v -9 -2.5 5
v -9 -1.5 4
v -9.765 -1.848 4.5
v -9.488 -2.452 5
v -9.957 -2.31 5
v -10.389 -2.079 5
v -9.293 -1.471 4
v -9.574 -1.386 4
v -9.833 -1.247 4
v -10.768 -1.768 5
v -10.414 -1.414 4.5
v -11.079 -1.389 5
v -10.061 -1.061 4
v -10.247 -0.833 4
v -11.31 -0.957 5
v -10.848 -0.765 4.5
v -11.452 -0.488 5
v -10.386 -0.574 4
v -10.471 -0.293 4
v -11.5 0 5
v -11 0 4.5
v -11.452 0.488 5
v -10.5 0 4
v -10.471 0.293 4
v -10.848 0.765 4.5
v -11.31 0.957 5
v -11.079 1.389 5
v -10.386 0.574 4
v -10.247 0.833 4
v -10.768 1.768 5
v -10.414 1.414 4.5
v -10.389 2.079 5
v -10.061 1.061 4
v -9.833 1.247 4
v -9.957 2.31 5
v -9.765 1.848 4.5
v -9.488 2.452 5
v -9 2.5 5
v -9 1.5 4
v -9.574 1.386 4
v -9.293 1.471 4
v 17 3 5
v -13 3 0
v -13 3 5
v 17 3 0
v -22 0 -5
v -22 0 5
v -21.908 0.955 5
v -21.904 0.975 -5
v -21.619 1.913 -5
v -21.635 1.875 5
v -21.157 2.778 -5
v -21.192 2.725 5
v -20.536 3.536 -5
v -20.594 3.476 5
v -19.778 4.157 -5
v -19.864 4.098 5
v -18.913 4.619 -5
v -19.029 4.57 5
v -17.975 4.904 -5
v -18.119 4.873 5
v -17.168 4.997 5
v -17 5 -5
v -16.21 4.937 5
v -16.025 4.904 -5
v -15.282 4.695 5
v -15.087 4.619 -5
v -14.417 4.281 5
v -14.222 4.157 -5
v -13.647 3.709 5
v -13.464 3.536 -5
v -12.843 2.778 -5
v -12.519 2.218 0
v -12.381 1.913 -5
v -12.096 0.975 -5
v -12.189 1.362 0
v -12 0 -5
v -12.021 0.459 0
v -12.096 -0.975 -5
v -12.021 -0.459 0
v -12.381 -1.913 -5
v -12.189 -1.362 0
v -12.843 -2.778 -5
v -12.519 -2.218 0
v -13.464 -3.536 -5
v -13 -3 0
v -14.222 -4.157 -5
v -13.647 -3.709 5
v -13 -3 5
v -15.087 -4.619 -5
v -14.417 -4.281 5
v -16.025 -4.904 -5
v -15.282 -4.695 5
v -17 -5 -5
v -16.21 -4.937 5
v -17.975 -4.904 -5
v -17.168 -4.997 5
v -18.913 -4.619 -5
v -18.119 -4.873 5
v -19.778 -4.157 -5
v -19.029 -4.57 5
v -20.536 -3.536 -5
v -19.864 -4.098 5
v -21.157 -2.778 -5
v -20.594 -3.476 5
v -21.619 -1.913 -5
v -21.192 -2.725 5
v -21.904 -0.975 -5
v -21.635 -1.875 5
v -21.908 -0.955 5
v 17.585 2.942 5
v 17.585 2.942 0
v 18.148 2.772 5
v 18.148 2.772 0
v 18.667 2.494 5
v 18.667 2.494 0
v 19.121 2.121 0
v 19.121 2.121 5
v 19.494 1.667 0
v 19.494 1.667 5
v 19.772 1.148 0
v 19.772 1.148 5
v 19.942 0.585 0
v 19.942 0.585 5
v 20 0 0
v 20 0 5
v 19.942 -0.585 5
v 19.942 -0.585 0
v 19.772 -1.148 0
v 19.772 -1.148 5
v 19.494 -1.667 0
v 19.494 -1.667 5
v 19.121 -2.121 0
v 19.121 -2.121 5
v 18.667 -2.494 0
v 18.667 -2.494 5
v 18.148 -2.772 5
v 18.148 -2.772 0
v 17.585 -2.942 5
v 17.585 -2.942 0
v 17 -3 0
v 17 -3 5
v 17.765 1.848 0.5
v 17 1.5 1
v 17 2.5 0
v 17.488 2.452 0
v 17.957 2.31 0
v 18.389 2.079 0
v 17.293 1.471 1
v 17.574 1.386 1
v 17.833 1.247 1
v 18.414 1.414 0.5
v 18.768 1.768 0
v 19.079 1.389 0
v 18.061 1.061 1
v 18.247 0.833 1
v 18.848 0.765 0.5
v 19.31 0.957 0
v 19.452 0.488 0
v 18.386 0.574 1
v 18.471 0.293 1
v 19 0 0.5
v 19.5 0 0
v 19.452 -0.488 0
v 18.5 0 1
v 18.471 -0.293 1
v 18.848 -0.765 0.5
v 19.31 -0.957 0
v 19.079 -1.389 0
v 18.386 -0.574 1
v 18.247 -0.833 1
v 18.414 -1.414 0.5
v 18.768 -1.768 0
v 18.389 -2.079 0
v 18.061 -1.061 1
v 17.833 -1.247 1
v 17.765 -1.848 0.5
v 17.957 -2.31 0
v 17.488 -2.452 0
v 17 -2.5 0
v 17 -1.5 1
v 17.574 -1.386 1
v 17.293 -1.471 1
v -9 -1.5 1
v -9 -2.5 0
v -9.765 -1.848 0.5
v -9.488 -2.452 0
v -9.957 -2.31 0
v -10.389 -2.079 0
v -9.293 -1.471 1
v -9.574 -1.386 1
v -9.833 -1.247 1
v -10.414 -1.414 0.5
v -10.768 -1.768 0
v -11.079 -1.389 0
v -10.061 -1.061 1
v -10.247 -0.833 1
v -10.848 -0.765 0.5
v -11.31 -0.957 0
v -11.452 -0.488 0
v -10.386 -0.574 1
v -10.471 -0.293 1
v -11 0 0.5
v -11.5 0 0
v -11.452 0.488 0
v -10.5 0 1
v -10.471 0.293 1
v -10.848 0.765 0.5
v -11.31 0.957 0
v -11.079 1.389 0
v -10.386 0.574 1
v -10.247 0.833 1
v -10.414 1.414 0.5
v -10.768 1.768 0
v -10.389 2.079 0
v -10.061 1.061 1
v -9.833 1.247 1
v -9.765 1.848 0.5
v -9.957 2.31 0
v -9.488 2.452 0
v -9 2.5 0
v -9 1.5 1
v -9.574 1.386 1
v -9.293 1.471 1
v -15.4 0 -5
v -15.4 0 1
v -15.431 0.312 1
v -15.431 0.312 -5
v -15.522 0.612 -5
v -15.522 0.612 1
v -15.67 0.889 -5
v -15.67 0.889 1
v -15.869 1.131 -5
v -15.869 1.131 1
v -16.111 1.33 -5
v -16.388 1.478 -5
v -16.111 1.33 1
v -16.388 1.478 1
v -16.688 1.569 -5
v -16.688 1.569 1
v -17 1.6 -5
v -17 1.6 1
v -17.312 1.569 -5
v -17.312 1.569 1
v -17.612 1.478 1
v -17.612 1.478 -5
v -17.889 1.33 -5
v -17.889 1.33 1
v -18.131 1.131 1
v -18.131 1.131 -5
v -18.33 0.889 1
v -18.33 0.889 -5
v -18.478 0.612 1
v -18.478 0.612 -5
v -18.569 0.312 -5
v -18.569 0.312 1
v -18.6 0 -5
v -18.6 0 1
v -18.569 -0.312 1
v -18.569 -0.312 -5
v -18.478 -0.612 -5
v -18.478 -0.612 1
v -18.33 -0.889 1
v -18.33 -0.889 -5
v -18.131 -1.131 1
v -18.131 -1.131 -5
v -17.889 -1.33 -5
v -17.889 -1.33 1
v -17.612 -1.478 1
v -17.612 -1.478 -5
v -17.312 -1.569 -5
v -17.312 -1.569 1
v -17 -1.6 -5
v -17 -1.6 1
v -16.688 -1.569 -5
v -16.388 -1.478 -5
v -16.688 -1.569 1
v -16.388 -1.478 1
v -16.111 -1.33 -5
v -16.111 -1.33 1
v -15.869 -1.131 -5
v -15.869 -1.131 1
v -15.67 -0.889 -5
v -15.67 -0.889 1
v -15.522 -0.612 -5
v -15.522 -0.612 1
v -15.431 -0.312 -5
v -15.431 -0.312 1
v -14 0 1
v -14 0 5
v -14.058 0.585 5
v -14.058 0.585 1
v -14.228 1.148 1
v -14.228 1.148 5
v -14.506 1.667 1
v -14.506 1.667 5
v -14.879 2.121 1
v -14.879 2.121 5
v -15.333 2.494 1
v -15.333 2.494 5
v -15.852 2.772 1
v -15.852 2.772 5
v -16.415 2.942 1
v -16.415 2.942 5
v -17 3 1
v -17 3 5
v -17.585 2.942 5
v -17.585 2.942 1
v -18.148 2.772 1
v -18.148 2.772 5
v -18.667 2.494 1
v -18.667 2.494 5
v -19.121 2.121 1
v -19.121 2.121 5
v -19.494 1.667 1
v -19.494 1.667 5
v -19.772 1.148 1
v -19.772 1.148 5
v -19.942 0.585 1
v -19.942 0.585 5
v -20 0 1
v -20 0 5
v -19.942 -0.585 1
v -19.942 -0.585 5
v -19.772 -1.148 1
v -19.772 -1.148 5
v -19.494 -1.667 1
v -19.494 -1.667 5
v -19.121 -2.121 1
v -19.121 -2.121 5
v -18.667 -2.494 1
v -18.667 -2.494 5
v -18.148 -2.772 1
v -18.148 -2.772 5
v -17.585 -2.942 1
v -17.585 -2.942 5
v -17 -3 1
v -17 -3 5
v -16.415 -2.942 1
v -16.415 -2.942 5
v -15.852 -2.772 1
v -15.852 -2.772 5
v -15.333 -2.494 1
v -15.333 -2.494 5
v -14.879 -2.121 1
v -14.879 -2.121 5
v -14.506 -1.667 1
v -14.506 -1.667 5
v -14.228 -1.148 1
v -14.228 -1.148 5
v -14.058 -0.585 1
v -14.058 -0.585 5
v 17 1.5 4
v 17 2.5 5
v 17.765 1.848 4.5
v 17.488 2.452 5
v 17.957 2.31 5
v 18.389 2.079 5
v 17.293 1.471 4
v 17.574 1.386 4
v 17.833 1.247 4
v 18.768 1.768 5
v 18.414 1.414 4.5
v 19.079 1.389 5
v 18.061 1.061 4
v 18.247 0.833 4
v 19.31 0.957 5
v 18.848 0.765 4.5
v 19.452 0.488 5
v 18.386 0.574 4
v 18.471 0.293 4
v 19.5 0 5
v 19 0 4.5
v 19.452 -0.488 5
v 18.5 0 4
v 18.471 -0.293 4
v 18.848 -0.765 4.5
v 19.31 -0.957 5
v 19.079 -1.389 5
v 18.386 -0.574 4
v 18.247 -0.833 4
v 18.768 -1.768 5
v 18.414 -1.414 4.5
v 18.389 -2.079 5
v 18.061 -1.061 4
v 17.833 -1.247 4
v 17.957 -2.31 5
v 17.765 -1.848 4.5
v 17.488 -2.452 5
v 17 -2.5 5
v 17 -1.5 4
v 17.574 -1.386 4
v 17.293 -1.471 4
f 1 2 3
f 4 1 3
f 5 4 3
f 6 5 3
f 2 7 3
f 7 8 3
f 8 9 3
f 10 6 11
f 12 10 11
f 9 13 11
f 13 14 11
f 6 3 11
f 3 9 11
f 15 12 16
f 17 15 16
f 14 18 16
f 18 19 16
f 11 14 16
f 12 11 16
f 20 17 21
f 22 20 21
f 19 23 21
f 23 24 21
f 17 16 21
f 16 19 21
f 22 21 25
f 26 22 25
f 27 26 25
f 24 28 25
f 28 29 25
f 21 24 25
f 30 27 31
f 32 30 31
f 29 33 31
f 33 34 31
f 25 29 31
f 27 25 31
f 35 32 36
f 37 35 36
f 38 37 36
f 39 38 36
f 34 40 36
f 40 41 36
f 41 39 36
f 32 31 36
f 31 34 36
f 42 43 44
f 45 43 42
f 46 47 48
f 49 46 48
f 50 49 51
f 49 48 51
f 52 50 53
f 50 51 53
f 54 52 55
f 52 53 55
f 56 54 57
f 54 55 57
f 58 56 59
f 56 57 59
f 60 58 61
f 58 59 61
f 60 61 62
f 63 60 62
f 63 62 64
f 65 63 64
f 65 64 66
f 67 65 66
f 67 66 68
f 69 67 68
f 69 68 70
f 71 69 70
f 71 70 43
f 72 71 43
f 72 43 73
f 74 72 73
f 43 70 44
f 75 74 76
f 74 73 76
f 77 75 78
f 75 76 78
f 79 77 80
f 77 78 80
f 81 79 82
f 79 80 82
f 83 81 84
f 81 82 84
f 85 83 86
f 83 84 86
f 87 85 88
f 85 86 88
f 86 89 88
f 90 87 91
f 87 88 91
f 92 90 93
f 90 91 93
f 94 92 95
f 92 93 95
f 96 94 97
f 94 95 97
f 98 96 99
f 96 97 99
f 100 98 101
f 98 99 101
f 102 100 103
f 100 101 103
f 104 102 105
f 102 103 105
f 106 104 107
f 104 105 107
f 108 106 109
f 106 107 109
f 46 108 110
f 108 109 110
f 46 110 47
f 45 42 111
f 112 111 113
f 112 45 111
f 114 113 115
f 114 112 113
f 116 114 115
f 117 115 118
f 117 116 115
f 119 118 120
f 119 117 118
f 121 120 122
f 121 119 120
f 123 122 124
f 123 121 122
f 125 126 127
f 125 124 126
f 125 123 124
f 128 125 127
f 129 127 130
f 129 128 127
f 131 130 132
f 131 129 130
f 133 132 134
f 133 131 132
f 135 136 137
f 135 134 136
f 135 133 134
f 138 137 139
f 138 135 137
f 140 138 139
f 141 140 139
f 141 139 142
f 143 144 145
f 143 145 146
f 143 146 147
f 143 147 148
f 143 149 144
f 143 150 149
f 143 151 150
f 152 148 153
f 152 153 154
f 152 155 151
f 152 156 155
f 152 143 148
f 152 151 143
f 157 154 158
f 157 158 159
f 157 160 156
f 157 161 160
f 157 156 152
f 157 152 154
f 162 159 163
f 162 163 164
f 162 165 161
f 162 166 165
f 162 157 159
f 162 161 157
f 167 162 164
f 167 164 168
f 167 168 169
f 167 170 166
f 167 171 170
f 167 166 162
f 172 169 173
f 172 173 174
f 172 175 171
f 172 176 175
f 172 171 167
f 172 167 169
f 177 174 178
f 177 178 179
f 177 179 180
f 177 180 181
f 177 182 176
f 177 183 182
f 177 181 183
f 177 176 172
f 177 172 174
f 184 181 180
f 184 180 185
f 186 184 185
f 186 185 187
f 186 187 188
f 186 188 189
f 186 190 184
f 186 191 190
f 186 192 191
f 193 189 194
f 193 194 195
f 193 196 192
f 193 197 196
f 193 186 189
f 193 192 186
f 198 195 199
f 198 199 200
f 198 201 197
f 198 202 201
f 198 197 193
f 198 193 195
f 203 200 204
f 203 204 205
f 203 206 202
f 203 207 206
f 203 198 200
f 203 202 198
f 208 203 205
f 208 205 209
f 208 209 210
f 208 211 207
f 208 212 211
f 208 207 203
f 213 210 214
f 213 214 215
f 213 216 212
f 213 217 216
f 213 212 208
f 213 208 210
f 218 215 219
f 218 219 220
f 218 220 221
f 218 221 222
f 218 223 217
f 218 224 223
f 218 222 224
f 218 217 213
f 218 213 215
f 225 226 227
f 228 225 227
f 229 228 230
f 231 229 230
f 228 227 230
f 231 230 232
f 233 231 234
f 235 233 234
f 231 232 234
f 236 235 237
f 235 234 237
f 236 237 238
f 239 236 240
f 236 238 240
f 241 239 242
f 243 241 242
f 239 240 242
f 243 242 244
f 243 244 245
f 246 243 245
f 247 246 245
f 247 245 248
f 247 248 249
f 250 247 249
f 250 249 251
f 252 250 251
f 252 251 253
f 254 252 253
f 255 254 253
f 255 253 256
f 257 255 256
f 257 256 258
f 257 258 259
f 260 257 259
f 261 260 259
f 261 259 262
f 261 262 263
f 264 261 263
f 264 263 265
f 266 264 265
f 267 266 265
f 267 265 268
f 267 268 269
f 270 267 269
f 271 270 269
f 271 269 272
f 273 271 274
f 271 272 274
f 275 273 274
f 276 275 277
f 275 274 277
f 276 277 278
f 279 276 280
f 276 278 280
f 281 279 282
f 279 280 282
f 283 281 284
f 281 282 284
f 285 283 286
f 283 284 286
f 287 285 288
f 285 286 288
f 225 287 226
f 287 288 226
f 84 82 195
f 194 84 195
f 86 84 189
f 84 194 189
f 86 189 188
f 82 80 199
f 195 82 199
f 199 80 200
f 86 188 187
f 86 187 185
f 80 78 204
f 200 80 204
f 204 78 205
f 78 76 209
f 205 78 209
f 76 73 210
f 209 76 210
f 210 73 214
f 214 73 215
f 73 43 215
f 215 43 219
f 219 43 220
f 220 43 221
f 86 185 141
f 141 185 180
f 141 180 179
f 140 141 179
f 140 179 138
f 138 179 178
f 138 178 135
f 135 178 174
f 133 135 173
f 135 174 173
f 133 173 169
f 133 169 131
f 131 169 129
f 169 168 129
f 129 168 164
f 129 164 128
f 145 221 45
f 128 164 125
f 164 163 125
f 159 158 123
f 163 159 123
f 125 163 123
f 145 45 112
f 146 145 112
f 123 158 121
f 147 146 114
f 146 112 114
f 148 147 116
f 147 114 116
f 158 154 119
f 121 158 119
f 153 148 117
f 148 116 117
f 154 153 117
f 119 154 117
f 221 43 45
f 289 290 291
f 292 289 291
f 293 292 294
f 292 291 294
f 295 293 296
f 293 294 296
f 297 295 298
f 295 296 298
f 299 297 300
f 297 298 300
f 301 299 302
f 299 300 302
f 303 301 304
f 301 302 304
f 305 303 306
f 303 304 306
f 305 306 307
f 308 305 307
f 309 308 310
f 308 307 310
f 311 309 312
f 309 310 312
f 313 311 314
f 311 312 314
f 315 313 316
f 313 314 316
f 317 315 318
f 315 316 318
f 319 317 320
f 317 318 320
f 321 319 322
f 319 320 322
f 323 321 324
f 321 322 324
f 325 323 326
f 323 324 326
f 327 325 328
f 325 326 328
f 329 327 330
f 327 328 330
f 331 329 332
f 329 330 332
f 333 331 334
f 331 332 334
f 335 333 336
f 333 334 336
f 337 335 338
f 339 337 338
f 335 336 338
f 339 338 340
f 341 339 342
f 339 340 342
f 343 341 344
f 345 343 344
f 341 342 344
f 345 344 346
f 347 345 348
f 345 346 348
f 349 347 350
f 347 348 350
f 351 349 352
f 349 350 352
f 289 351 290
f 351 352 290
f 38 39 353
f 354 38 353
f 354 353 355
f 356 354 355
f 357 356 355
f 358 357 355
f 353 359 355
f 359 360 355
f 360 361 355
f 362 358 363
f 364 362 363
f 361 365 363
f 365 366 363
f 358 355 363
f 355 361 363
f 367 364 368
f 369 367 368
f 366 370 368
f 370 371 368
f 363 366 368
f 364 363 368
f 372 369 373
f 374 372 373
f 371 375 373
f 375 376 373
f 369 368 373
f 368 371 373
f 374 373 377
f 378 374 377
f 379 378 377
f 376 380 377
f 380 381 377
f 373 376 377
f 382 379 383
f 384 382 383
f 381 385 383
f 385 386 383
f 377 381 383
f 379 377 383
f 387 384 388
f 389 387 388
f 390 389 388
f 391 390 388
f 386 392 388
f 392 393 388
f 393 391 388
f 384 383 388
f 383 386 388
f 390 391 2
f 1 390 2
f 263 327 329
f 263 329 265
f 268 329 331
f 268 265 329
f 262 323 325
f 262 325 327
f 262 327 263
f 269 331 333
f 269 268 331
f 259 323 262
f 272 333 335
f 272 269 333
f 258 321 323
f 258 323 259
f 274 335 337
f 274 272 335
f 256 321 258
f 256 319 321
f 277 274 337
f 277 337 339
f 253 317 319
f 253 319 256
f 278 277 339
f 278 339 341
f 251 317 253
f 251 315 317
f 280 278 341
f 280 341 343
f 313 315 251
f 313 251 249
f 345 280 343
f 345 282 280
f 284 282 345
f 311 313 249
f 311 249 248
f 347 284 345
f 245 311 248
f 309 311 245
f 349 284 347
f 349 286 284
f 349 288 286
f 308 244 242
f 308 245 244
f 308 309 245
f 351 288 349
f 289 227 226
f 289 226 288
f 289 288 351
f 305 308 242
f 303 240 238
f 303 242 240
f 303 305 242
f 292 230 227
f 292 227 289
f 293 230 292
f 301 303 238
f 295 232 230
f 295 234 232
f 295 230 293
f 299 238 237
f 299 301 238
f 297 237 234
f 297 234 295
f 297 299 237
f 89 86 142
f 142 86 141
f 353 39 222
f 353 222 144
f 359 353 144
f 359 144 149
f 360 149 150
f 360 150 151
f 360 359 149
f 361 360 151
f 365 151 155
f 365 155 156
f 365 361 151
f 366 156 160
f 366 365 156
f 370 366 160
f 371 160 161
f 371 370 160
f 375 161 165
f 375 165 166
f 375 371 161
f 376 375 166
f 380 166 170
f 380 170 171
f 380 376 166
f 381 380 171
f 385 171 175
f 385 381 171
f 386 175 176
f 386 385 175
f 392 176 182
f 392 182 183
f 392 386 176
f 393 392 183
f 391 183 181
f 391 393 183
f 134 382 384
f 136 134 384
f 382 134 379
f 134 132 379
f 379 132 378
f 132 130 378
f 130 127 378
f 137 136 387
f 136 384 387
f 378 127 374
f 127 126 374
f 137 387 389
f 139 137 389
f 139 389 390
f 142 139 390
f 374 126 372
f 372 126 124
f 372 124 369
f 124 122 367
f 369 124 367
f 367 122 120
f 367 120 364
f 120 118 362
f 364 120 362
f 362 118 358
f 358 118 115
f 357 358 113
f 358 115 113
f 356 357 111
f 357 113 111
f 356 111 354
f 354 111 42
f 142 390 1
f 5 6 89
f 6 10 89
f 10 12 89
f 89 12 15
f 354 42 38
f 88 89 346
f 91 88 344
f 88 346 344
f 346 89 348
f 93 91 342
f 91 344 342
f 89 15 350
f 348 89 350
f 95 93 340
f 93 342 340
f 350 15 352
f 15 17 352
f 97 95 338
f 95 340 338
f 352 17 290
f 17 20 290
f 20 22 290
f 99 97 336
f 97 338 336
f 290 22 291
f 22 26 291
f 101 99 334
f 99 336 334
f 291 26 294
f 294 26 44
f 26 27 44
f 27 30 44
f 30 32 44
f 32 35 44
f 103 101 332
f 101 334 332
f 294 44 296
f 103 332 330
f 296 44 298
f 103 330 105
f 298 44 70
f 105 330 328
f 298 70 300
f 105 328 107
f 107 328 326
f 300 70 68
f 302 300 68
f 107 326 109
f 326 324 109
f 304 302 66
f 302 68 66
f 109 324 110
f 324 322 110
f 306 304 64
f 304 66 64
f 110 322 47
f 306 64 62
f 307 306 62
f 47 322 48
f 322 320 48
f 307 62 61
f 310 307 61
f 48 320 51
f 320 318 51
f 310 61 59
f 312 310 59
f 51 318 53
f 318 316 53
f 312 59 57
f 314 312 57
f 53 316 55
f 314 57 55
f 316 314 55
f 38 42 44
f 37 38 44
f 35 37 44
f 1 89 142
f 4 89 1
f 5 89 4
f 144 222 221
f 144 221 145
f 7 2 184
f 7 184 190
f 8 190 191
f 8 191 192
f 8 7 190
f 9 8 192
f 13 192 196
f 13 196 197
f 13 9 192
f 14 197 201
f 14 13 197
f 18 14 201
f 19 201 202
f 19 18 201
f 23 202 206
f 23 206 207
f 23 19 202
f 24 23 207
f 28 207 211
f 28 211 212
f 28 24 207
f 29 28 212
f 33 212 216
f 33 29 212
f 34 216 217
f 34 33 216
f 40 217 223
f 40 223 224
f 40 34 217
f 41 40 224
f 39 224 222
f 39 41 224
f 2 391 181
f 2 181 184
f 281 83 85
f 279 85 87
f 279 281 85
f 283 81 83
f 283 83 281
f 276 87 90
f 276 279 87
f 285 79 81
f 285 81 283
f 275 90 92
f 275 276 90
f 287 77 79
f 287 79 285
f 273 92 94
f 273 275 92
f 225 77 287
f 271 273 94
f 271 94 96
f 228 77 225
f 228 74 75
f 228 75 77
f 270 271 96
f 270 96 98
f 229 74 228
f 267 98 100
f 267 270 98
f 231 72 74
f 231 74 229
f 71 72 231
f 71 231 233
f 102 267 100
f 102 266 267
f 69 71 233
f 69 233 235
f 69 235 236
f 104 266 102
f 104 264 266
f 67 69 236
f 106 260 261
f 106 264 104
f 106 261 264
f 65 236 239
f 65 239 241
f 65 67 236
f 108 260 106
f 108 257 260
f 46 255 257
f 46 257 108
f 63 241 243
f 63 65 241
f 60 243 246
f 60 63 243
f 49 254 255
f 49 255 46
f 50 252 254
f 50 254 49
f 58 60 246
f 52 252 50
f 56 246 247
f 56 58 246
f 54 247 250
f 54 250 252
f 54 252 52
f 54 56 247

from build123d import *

# Parameters (mm, degrees)
SKETCH_1_W          = 40
SKETCH_1_H          = 6
EXTRUDE_1_DEPTH     = 5
SKETCH_3_R          = 3
EXTRUDE_2_DEPTH     = 5
CUT_EXTRUDE_1_DEPTH = 21.832666656
FILLET_1_RADIUS     = 3
FILLET_1_LENGTH     = 5
SKETCH_5_R          = 1.5
CUT_EXTRUDE_2_DEPTH = 23.561028345
SKETCH_6_R          = 2.5
CUT_EXTRUDE_3_DEPTH = 3
CHAMFER_2_SIZE      = 1
SKETCH_7_R          = 4
EXTRUDE_3_DEPTH     = 10
SKETCH_8_R          = 1.5
CUT_EXTRUDE_4_DEPTH = 24.600847442
SKETCH_9_R          = 3
CUT_EXTRUDE_5_DEPTH = 2
SKETCH_10_R         = 1.6
CUT_EXTRUDE_6_DEPTH = 24.600847442
EXTRUDE_START       = -10
SKETCH_11_R         = 5
SKETCH_11_R_2       = 1.6
EXTRUDE_4_DEPTH     = 10
SKETCH_12_R         = 3
CUT_EXTRUDE_7_DEPTH = 4


with BuildPart() as part:
    # Эскиз1 → Бобышка-Вытянуть1 (new body)
    with BuildSketch(Plane.XY):
        Rectangle(SKETCH_1_W, SKETCH_1_H)
    extrude(amount=EXTRUDE_1_DEPTH)

    # Эскиз3 → Бобышка-Вытянуть2 (add)
    with BuildSketch(Plane(origin=(0, 0, 0), x_dir=(-1, 0, 0), z_dir=(0, 0, -1))):
        with Locations((17, 0)):
            Circle(SKETCH_3_R)
    extrude(amount=EXTRUDE_2_DEPTH)

    # Эскиз4 → Вырез-Вытянуть1 (cut, through all)
    with BuildSketch(Plane(origin=(0, 0, 0), x_dir=(-1, 0, 0), z_dir=(0, 0, -1))):
        with BuildLine():
            Line((20, 3), (17, 3))
            ThreePointArc((17, 3), (19.121320344, 2.121320344), (20, 0))
            Line((20, 0), (20, 3))
        make_face()
        with BuildLine():
            Line((20, -3), (20, 0))
            ThreePointArc((20, 0), (19.121320344, -2.121320344), (17, -3))
            Line((17, -3), (20, -3))
        make_face()
    extrude(amount=-CUT_EXTRUDE_1_DEPTH, mode=Mode.SUBTRACT)

    # Скругление1: full round fillet: the end face becomes a half cylinder, R = half its width
    fillet_1_face = Plane((20, 0, 2.5), x_dir=(0, 0, -1), z_dir=(1, 0, 0))  # on the end face: x along it, z out of the body
    fillet_1_slab = fillet_1_face.offset(-FILLET_1_RADIUS / 2) * Box(FILLET_1_LENGTH, 2 * FILLET_1_RADIUS, FILLET_1_RADIUS, mode=Mode.PRIVATE)  # the body's end, R deep
    fillet_1_round = Plane((17, 0, 2.5), x_dir=(1, 0, 0), z_dir=(0, 0, -1)) * Cylinder(FILLET_1_RADIUS, FILLET_1_LENGTH, mode=Mode.PRIVATE)  # its axis R under the face
    add(fillet_1_slab - fillet_1_round, mode=Mode.SUBTRACT)

    # Эскиз5 → Вырез-Вытянуть2 (cut, through all)
    with BuildSketch(Plane.XY.offset(5)):
        with Locations((-17, 0)):
            Circle(SKETCH_5_R)
        with BuildLine():
            Line((-9, 1.5), (17, 1.5))
            ThreePointArc((17, 1.5), (18.5, 0), (17, -1.5))
            Line((17, -1.5), (-9, -1.5))
            ThreePointArc((-9, -1.5), (-10.5, 0), (-9, 1.5))
        make_face()
    extrude(amount=-CUT_EXTRUDE_2_DEPTH, mode=Mode.SUBTRACT)

    # Эскиз6 → Вырез-Вытянуть3 (cut)
    with BuildSketch(Plane.XY.offset(5)):
        with Locations((-17, 0)):
            Circle(SKETCH_6_R)
    extrude(amount=-CUT_EXTRUDE_3_DEPTH, mode=Mode.SUBTRACT)

    # Фаска2
    chamfer_2_edges = [part.edges().sort_by_distance(p)[0] for p in [
        (4, -1.5, 0),
        (18.5, 0, 0),
        (4, 1.5, 0),
        (-10.5, 0, 0),
        (4, 1.5, 5),
        (-10.5, 0, 5),
        (4, -1.5, 5),
        (18.5, 0, 5),
    ]]
    chamfer(chamfer_2_edges, length=CHAMFER_2_SIZE)

    # Эскиз7 → Бобышка-Вытянуть3 (add)
    with BuildSketch(Plane.XY.offset(5)):
        with Locations((-17, 0)):
            Circle(SKETCH_7_R)
    extrude(amount=-EXTRUDE_3_DEPTH)

    # Эскиз8 → Вырез-Вытянуть4 (cut, through all)
    with BuildSketch(Plane.XY.offset(5)):
        with Locations((-17, 0)):
            Circle(SKETCH_8_R)
    extrude(amount=-CUT_EXTRUDE_4_DEPTH, mode=Mode.SUBTRACT)

    # Эскиз9 → Вырез-Вытянуть5 (cut)
    with BuildSketch(Plane.XY.offset(5)):
        with Locations((-17, 0)):
            Circle(SKETCH_9_R)
    extrude(amount=-CUT_EXTRUDE_5_DEPTH, mode=Mode.SUBTRACT)

    # Эскиз10 → Вырез-Вытянуть6 (cut, through all)
    with BuildSketch(Plane.XY.offset(5)):
        with Locations((-17, 0)):
            Circle(SKETCH_10_R)
    extrude(amount=-CUT_EXTRUDE_6_DEPTH, mode=Mode.SUBTRACT)

    # Эскиз11 → Бобышка-Вытянуть4 (add)
    with BuildSketch(Plane(origin=(0, 0, -5), x_dir=(-1, 0, 0), z_dir=(0, 0, -1)).offset(EXTRUDE_START)):
        with Locations((17, 0)):
            Circle(SKETCH_11_R)
        with Locations(Location((17, 0, 0), (0, 0, 180))):
            Circle(SKETCH_11_R_2, mode=Mode.SUBTRACT)
    extrude(amount=EXTRUDE_4_DEPTH)

    # Эскиз12 → Вырез-Вытянуть7 (cut)
    with BuildSketch(Plane.XY.offset(5)):
        with Locations((-17, 0)):
            Circle(SKETCH_12_R)
    extrude(amount=-CUT_EXTRUDE_7_DEPTH, mode=Mode.SUBTRACT)


solid = part.part
